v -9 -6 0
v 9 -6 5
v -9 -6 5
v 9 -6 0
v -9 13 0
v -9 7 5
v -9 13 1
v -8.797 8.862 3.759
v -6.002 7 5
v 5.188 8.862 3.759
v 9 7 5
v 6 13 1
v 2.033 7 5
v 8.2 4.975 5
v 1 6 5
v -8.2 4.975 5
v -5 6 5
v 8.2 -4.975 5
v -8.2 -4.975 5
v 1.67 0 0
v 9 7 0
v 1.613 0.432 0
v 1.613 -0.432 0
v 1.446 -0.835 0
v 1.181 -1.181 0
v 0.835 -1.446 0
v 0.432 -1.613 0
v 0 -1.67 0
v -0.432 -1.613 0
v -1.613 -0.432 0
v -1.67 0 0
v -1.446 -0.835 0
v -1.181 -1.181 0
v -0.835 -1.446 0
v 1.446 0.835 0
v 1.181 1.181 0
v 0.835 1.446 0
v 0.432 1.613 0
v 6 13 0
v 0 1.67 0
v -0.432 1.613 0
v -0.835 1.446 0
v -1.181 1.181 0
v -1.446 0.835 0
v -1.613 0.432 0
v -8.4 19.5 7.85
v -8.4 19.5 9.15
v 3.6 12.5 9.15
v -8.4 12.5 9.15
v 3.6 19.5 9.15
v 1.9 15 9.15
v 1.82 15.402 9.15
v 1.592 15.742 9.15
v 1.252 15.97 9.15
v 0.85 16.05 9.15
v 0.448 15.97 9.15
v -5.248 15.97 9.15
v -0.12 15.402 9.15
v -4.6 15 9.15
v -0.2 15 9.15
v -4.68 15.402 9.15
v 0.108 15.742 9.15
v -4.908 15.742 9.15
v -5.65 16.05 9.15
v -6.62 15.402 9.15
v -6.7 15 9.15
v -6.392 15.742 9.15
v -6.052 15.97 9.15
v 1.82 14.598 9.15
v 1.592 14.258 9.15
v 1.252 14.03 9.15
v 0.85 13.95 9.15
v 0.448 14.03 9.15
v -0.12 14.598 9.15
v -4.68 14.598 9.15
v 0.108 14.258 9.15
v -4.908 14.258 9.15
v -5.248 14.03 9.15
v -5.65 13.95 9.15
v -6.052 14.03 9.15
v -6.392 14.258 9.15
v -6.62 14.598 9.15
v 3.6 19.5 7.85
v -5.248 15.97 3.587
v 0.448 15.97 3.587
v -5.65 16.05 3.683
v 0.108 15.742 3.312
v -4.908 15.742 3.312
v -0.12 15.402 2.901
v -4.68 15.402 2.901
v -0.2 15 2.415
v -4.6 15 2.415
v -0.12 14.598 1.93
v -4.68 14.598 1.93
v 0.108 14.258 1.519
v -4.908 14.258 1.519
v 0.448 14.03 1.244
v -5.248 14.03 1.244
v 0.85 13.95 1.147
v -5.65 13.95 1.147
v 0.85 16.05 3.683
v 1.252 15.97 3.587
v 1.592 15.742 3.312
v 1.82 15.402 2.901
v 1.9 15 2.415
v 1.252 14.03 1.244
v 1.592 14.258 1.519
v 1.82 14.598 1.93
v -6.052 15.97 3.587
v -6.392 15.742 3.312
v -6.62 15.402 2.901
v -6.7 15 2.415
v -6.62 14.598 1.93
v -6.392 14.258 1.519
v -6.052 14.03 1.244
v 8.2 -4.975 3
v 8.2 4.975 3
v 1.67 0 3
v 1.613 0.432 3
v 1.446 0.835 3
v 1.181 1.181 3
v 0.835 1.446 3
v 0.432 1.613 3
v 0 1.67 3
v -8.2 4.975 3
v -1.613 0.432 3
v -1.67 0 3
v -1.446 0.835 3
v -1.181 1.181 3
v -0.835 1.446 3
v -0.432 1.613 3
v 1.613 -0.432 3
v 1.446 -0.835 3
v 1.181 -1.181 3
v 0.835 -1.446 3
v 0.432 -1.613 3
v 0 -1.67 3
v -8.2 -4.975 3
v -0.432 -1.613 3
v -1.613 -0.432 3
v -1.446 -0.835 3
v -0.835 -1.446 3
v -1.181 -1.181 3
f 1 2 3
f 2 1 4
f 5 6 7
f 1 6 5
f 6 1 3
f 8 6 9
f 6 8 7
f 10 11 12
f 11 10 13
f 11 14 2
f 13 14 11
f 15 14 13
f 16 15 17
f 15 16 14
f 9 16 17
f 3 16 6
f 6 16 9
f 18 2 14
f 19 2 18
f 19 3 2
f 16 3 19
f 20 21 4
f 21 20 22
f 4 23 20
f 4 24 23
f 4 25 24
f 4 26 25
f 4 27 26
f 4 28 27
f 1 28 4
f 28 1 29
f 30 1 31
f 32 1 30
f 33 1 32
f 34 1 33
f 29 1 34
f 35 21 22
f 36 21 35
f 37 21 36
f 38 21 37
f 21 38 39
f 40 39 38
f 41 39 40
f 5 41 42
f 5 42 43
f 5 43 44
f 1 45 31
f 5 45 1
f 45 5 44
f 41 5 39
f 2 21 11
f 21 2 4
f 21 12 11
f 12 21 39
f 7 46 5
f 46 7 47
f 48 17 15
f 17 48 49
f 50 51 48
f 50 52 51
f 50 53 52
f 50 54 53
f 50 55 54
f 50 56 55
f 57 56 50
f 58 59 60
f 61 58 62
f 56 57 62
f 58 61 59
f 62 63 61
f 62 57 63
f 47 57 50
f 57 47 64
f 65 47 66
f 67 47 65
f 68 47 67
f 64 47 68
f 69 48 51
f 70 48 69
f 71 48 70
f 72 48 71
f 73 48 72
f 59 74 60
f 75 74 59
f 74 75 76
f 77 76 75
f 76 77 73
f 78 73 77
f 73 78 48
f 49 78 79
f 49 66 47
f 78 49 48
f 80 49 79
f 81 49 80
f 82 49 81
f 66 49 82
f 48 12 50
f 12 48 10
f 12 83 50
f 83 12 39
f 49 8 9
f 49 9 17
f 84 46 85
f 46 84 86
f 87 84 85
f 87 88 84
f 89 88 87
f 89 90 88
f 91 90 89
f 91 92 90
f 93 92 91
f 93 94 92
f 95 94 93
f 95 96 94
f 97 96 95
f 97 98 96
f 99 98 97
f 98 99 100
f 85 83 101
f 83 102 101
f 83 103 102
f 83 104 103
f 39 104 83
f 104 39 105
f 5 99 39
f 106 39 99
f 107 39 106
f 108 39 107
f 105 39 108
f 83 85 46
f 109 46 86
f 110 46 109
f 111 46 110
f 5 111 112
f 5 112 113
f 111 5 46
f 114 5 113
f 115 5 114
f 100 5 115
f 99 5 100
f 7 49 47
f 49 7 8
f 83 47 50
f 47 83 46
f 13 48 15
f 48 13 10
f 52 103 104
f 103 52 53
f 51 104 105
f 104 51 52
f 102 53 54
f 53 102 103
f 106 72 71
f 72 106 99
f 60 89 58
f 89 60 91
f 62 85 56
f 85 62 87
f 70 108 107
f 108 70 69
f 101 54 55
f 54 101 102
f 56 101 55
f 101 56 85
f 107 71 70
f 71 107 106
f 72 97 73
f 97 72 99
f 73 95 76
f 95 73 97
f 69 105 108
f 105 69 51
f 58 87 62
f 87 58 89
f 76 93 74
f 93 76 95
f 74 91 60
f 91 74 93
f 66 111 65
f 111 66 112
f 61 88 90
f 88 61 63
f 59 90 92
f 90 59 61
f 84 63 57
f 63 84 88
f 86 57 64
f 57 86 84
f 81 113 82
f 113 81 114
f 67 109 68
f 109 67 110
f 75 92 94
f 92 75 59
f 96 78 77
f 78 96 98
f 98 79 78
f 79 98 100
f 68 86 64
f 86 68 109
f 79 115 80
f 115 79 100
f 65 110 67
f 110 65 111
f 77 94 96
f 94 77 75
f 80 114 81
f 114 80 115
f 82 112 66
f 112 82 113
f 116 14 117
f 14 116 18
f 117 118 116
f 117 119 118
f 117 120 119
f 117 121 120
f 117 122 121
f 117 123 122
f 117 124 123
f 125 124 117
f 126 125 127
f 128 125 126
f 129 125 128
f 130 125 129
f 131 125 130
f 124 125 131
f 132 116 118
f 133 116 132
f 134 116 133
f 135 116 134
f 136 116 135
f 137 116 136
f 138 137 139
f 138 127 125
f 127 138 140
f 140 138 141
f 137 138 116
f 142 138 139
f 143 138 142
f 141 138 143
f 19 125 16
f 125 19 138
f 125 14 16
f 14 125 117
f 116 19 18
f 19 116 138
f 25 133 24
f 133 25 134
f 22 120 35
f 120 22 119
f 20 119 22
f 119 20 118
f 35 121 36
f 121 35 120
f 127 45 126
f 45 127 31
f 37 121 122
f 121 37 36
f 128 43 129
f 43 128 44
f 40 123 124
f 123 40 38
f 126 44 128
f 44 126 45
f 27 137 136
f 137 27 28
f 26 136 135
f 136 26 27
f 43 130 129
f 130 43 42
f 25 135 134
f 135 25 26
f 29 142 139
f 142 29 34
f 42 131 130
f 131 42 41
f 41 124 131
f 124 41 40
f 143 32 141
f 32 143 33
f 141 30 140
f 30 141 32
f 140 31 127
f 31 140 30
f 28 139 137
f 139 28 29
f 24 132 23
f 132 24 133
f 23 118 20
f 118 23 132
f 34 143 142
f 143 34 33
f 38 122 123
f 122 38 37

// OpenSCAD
// file: nanoswitch.scad
module nanoswitchHoles() {
   translate([ 6.5/2,0,-15+13]) cylinder(h=33,r=1+.05,$fn=16);
   translate([-6.5/2,0,-15   ]) cylinder(h=33,r=1+.05,$fn=16);
}

module nanoswitch() {
  difference() {
      translate([-12.8/2,-1,0]) cube([12.8,6.2,5.75]);
      translate([0,0,-1]) nanoswitchHoles();
    }
  #translate([12.8/2-4,6.2-1,1]) cylinder(h=5.75-2,r=0.45,$fn=16);
}

// little slot to help glide probe handle on top of switch
module guideSlot() {
  difference() {
    union() {
      translate([-2.75,0,0]) scale([1,2,1]) cylinder(h=4,r=2,$fn=36);
      translate([ 2.75,0,0]) scale([1,2,1]) cylinder(h=4,r=2,$fn=36);
      hull() {
        translate([-11,-10,0]) cube([18,1,4]);
        translate([-9,-1,0]) cube([15,1,4]);
      }
      translate([-4.5,0,2]) cube([6,4,4],center=true);
    }
  cylinder(h=5,r=.75,$fn=18);
  }
}

module nanoswitchGuide() {
  intersection() {
    difference() {
      hull() {
        translate([-4,0,0]) cylinder(r=3,h=2,$fn=24);
        translate([ 4,0,0]) cylinder(r=3,h=2,$fn=24);
        translate([ 2.4,6,0]) scale([2,1,1]) cylinder(r=2,h=2,$fn=36);
      }
      translate([0,0,-1]) nanoswitchHoles();
    }
    translate([2.4,5.2,-1]) guideSlot();
  }
}

%translate([0,0,-5.75]) nanoswitch();
projection(cut=true) {translate([0,0,-2]) nanoswitchGuide();}
// main file
use <nanoswitch.scad>;

ew = 16.1+.3;
eh = 9.75+.2;
difference() {
  union() {
    hull() {
      translate([-9,-6,0]) cube([18,13,5]);
      translate([-1.5,10,0.5]) cube([15,6,1],center=true);
    }
    hull() {
      translate([-2.4,16,8.5]) cube([12,7,1.3],center=true);
      //translate([-1,7,3]) scale([8,2,2]) sphere(1,$fn=12);
      translate([-2,7,3]) cube([6,2,4],center=true);
      translate([-1.5,10,0.5]) cube([15,6,1],center=true);
    }
  }
  translate([-ew/2,-eh/2,3]) cube([ew,eh,5]);
  translate([0,0,-1]) cylinder(r=2.94/2+.2,h=9,$fn=24);
  translate([-2.4,15,0]) nanoswitchHoles();
}

translate([-2.4,15,9.15]) %nanoswitch();
%translate([0,25,12]) rotate([90,0,0]) cylinder(h=15,r=.2,$fn=4); // show where hot-end tip centerline is
%translate([0,9.8/2,12]) rotate([-90,0,0]) cylinder(h=4.5,r2=0.3,r1=4,$fn=24);
